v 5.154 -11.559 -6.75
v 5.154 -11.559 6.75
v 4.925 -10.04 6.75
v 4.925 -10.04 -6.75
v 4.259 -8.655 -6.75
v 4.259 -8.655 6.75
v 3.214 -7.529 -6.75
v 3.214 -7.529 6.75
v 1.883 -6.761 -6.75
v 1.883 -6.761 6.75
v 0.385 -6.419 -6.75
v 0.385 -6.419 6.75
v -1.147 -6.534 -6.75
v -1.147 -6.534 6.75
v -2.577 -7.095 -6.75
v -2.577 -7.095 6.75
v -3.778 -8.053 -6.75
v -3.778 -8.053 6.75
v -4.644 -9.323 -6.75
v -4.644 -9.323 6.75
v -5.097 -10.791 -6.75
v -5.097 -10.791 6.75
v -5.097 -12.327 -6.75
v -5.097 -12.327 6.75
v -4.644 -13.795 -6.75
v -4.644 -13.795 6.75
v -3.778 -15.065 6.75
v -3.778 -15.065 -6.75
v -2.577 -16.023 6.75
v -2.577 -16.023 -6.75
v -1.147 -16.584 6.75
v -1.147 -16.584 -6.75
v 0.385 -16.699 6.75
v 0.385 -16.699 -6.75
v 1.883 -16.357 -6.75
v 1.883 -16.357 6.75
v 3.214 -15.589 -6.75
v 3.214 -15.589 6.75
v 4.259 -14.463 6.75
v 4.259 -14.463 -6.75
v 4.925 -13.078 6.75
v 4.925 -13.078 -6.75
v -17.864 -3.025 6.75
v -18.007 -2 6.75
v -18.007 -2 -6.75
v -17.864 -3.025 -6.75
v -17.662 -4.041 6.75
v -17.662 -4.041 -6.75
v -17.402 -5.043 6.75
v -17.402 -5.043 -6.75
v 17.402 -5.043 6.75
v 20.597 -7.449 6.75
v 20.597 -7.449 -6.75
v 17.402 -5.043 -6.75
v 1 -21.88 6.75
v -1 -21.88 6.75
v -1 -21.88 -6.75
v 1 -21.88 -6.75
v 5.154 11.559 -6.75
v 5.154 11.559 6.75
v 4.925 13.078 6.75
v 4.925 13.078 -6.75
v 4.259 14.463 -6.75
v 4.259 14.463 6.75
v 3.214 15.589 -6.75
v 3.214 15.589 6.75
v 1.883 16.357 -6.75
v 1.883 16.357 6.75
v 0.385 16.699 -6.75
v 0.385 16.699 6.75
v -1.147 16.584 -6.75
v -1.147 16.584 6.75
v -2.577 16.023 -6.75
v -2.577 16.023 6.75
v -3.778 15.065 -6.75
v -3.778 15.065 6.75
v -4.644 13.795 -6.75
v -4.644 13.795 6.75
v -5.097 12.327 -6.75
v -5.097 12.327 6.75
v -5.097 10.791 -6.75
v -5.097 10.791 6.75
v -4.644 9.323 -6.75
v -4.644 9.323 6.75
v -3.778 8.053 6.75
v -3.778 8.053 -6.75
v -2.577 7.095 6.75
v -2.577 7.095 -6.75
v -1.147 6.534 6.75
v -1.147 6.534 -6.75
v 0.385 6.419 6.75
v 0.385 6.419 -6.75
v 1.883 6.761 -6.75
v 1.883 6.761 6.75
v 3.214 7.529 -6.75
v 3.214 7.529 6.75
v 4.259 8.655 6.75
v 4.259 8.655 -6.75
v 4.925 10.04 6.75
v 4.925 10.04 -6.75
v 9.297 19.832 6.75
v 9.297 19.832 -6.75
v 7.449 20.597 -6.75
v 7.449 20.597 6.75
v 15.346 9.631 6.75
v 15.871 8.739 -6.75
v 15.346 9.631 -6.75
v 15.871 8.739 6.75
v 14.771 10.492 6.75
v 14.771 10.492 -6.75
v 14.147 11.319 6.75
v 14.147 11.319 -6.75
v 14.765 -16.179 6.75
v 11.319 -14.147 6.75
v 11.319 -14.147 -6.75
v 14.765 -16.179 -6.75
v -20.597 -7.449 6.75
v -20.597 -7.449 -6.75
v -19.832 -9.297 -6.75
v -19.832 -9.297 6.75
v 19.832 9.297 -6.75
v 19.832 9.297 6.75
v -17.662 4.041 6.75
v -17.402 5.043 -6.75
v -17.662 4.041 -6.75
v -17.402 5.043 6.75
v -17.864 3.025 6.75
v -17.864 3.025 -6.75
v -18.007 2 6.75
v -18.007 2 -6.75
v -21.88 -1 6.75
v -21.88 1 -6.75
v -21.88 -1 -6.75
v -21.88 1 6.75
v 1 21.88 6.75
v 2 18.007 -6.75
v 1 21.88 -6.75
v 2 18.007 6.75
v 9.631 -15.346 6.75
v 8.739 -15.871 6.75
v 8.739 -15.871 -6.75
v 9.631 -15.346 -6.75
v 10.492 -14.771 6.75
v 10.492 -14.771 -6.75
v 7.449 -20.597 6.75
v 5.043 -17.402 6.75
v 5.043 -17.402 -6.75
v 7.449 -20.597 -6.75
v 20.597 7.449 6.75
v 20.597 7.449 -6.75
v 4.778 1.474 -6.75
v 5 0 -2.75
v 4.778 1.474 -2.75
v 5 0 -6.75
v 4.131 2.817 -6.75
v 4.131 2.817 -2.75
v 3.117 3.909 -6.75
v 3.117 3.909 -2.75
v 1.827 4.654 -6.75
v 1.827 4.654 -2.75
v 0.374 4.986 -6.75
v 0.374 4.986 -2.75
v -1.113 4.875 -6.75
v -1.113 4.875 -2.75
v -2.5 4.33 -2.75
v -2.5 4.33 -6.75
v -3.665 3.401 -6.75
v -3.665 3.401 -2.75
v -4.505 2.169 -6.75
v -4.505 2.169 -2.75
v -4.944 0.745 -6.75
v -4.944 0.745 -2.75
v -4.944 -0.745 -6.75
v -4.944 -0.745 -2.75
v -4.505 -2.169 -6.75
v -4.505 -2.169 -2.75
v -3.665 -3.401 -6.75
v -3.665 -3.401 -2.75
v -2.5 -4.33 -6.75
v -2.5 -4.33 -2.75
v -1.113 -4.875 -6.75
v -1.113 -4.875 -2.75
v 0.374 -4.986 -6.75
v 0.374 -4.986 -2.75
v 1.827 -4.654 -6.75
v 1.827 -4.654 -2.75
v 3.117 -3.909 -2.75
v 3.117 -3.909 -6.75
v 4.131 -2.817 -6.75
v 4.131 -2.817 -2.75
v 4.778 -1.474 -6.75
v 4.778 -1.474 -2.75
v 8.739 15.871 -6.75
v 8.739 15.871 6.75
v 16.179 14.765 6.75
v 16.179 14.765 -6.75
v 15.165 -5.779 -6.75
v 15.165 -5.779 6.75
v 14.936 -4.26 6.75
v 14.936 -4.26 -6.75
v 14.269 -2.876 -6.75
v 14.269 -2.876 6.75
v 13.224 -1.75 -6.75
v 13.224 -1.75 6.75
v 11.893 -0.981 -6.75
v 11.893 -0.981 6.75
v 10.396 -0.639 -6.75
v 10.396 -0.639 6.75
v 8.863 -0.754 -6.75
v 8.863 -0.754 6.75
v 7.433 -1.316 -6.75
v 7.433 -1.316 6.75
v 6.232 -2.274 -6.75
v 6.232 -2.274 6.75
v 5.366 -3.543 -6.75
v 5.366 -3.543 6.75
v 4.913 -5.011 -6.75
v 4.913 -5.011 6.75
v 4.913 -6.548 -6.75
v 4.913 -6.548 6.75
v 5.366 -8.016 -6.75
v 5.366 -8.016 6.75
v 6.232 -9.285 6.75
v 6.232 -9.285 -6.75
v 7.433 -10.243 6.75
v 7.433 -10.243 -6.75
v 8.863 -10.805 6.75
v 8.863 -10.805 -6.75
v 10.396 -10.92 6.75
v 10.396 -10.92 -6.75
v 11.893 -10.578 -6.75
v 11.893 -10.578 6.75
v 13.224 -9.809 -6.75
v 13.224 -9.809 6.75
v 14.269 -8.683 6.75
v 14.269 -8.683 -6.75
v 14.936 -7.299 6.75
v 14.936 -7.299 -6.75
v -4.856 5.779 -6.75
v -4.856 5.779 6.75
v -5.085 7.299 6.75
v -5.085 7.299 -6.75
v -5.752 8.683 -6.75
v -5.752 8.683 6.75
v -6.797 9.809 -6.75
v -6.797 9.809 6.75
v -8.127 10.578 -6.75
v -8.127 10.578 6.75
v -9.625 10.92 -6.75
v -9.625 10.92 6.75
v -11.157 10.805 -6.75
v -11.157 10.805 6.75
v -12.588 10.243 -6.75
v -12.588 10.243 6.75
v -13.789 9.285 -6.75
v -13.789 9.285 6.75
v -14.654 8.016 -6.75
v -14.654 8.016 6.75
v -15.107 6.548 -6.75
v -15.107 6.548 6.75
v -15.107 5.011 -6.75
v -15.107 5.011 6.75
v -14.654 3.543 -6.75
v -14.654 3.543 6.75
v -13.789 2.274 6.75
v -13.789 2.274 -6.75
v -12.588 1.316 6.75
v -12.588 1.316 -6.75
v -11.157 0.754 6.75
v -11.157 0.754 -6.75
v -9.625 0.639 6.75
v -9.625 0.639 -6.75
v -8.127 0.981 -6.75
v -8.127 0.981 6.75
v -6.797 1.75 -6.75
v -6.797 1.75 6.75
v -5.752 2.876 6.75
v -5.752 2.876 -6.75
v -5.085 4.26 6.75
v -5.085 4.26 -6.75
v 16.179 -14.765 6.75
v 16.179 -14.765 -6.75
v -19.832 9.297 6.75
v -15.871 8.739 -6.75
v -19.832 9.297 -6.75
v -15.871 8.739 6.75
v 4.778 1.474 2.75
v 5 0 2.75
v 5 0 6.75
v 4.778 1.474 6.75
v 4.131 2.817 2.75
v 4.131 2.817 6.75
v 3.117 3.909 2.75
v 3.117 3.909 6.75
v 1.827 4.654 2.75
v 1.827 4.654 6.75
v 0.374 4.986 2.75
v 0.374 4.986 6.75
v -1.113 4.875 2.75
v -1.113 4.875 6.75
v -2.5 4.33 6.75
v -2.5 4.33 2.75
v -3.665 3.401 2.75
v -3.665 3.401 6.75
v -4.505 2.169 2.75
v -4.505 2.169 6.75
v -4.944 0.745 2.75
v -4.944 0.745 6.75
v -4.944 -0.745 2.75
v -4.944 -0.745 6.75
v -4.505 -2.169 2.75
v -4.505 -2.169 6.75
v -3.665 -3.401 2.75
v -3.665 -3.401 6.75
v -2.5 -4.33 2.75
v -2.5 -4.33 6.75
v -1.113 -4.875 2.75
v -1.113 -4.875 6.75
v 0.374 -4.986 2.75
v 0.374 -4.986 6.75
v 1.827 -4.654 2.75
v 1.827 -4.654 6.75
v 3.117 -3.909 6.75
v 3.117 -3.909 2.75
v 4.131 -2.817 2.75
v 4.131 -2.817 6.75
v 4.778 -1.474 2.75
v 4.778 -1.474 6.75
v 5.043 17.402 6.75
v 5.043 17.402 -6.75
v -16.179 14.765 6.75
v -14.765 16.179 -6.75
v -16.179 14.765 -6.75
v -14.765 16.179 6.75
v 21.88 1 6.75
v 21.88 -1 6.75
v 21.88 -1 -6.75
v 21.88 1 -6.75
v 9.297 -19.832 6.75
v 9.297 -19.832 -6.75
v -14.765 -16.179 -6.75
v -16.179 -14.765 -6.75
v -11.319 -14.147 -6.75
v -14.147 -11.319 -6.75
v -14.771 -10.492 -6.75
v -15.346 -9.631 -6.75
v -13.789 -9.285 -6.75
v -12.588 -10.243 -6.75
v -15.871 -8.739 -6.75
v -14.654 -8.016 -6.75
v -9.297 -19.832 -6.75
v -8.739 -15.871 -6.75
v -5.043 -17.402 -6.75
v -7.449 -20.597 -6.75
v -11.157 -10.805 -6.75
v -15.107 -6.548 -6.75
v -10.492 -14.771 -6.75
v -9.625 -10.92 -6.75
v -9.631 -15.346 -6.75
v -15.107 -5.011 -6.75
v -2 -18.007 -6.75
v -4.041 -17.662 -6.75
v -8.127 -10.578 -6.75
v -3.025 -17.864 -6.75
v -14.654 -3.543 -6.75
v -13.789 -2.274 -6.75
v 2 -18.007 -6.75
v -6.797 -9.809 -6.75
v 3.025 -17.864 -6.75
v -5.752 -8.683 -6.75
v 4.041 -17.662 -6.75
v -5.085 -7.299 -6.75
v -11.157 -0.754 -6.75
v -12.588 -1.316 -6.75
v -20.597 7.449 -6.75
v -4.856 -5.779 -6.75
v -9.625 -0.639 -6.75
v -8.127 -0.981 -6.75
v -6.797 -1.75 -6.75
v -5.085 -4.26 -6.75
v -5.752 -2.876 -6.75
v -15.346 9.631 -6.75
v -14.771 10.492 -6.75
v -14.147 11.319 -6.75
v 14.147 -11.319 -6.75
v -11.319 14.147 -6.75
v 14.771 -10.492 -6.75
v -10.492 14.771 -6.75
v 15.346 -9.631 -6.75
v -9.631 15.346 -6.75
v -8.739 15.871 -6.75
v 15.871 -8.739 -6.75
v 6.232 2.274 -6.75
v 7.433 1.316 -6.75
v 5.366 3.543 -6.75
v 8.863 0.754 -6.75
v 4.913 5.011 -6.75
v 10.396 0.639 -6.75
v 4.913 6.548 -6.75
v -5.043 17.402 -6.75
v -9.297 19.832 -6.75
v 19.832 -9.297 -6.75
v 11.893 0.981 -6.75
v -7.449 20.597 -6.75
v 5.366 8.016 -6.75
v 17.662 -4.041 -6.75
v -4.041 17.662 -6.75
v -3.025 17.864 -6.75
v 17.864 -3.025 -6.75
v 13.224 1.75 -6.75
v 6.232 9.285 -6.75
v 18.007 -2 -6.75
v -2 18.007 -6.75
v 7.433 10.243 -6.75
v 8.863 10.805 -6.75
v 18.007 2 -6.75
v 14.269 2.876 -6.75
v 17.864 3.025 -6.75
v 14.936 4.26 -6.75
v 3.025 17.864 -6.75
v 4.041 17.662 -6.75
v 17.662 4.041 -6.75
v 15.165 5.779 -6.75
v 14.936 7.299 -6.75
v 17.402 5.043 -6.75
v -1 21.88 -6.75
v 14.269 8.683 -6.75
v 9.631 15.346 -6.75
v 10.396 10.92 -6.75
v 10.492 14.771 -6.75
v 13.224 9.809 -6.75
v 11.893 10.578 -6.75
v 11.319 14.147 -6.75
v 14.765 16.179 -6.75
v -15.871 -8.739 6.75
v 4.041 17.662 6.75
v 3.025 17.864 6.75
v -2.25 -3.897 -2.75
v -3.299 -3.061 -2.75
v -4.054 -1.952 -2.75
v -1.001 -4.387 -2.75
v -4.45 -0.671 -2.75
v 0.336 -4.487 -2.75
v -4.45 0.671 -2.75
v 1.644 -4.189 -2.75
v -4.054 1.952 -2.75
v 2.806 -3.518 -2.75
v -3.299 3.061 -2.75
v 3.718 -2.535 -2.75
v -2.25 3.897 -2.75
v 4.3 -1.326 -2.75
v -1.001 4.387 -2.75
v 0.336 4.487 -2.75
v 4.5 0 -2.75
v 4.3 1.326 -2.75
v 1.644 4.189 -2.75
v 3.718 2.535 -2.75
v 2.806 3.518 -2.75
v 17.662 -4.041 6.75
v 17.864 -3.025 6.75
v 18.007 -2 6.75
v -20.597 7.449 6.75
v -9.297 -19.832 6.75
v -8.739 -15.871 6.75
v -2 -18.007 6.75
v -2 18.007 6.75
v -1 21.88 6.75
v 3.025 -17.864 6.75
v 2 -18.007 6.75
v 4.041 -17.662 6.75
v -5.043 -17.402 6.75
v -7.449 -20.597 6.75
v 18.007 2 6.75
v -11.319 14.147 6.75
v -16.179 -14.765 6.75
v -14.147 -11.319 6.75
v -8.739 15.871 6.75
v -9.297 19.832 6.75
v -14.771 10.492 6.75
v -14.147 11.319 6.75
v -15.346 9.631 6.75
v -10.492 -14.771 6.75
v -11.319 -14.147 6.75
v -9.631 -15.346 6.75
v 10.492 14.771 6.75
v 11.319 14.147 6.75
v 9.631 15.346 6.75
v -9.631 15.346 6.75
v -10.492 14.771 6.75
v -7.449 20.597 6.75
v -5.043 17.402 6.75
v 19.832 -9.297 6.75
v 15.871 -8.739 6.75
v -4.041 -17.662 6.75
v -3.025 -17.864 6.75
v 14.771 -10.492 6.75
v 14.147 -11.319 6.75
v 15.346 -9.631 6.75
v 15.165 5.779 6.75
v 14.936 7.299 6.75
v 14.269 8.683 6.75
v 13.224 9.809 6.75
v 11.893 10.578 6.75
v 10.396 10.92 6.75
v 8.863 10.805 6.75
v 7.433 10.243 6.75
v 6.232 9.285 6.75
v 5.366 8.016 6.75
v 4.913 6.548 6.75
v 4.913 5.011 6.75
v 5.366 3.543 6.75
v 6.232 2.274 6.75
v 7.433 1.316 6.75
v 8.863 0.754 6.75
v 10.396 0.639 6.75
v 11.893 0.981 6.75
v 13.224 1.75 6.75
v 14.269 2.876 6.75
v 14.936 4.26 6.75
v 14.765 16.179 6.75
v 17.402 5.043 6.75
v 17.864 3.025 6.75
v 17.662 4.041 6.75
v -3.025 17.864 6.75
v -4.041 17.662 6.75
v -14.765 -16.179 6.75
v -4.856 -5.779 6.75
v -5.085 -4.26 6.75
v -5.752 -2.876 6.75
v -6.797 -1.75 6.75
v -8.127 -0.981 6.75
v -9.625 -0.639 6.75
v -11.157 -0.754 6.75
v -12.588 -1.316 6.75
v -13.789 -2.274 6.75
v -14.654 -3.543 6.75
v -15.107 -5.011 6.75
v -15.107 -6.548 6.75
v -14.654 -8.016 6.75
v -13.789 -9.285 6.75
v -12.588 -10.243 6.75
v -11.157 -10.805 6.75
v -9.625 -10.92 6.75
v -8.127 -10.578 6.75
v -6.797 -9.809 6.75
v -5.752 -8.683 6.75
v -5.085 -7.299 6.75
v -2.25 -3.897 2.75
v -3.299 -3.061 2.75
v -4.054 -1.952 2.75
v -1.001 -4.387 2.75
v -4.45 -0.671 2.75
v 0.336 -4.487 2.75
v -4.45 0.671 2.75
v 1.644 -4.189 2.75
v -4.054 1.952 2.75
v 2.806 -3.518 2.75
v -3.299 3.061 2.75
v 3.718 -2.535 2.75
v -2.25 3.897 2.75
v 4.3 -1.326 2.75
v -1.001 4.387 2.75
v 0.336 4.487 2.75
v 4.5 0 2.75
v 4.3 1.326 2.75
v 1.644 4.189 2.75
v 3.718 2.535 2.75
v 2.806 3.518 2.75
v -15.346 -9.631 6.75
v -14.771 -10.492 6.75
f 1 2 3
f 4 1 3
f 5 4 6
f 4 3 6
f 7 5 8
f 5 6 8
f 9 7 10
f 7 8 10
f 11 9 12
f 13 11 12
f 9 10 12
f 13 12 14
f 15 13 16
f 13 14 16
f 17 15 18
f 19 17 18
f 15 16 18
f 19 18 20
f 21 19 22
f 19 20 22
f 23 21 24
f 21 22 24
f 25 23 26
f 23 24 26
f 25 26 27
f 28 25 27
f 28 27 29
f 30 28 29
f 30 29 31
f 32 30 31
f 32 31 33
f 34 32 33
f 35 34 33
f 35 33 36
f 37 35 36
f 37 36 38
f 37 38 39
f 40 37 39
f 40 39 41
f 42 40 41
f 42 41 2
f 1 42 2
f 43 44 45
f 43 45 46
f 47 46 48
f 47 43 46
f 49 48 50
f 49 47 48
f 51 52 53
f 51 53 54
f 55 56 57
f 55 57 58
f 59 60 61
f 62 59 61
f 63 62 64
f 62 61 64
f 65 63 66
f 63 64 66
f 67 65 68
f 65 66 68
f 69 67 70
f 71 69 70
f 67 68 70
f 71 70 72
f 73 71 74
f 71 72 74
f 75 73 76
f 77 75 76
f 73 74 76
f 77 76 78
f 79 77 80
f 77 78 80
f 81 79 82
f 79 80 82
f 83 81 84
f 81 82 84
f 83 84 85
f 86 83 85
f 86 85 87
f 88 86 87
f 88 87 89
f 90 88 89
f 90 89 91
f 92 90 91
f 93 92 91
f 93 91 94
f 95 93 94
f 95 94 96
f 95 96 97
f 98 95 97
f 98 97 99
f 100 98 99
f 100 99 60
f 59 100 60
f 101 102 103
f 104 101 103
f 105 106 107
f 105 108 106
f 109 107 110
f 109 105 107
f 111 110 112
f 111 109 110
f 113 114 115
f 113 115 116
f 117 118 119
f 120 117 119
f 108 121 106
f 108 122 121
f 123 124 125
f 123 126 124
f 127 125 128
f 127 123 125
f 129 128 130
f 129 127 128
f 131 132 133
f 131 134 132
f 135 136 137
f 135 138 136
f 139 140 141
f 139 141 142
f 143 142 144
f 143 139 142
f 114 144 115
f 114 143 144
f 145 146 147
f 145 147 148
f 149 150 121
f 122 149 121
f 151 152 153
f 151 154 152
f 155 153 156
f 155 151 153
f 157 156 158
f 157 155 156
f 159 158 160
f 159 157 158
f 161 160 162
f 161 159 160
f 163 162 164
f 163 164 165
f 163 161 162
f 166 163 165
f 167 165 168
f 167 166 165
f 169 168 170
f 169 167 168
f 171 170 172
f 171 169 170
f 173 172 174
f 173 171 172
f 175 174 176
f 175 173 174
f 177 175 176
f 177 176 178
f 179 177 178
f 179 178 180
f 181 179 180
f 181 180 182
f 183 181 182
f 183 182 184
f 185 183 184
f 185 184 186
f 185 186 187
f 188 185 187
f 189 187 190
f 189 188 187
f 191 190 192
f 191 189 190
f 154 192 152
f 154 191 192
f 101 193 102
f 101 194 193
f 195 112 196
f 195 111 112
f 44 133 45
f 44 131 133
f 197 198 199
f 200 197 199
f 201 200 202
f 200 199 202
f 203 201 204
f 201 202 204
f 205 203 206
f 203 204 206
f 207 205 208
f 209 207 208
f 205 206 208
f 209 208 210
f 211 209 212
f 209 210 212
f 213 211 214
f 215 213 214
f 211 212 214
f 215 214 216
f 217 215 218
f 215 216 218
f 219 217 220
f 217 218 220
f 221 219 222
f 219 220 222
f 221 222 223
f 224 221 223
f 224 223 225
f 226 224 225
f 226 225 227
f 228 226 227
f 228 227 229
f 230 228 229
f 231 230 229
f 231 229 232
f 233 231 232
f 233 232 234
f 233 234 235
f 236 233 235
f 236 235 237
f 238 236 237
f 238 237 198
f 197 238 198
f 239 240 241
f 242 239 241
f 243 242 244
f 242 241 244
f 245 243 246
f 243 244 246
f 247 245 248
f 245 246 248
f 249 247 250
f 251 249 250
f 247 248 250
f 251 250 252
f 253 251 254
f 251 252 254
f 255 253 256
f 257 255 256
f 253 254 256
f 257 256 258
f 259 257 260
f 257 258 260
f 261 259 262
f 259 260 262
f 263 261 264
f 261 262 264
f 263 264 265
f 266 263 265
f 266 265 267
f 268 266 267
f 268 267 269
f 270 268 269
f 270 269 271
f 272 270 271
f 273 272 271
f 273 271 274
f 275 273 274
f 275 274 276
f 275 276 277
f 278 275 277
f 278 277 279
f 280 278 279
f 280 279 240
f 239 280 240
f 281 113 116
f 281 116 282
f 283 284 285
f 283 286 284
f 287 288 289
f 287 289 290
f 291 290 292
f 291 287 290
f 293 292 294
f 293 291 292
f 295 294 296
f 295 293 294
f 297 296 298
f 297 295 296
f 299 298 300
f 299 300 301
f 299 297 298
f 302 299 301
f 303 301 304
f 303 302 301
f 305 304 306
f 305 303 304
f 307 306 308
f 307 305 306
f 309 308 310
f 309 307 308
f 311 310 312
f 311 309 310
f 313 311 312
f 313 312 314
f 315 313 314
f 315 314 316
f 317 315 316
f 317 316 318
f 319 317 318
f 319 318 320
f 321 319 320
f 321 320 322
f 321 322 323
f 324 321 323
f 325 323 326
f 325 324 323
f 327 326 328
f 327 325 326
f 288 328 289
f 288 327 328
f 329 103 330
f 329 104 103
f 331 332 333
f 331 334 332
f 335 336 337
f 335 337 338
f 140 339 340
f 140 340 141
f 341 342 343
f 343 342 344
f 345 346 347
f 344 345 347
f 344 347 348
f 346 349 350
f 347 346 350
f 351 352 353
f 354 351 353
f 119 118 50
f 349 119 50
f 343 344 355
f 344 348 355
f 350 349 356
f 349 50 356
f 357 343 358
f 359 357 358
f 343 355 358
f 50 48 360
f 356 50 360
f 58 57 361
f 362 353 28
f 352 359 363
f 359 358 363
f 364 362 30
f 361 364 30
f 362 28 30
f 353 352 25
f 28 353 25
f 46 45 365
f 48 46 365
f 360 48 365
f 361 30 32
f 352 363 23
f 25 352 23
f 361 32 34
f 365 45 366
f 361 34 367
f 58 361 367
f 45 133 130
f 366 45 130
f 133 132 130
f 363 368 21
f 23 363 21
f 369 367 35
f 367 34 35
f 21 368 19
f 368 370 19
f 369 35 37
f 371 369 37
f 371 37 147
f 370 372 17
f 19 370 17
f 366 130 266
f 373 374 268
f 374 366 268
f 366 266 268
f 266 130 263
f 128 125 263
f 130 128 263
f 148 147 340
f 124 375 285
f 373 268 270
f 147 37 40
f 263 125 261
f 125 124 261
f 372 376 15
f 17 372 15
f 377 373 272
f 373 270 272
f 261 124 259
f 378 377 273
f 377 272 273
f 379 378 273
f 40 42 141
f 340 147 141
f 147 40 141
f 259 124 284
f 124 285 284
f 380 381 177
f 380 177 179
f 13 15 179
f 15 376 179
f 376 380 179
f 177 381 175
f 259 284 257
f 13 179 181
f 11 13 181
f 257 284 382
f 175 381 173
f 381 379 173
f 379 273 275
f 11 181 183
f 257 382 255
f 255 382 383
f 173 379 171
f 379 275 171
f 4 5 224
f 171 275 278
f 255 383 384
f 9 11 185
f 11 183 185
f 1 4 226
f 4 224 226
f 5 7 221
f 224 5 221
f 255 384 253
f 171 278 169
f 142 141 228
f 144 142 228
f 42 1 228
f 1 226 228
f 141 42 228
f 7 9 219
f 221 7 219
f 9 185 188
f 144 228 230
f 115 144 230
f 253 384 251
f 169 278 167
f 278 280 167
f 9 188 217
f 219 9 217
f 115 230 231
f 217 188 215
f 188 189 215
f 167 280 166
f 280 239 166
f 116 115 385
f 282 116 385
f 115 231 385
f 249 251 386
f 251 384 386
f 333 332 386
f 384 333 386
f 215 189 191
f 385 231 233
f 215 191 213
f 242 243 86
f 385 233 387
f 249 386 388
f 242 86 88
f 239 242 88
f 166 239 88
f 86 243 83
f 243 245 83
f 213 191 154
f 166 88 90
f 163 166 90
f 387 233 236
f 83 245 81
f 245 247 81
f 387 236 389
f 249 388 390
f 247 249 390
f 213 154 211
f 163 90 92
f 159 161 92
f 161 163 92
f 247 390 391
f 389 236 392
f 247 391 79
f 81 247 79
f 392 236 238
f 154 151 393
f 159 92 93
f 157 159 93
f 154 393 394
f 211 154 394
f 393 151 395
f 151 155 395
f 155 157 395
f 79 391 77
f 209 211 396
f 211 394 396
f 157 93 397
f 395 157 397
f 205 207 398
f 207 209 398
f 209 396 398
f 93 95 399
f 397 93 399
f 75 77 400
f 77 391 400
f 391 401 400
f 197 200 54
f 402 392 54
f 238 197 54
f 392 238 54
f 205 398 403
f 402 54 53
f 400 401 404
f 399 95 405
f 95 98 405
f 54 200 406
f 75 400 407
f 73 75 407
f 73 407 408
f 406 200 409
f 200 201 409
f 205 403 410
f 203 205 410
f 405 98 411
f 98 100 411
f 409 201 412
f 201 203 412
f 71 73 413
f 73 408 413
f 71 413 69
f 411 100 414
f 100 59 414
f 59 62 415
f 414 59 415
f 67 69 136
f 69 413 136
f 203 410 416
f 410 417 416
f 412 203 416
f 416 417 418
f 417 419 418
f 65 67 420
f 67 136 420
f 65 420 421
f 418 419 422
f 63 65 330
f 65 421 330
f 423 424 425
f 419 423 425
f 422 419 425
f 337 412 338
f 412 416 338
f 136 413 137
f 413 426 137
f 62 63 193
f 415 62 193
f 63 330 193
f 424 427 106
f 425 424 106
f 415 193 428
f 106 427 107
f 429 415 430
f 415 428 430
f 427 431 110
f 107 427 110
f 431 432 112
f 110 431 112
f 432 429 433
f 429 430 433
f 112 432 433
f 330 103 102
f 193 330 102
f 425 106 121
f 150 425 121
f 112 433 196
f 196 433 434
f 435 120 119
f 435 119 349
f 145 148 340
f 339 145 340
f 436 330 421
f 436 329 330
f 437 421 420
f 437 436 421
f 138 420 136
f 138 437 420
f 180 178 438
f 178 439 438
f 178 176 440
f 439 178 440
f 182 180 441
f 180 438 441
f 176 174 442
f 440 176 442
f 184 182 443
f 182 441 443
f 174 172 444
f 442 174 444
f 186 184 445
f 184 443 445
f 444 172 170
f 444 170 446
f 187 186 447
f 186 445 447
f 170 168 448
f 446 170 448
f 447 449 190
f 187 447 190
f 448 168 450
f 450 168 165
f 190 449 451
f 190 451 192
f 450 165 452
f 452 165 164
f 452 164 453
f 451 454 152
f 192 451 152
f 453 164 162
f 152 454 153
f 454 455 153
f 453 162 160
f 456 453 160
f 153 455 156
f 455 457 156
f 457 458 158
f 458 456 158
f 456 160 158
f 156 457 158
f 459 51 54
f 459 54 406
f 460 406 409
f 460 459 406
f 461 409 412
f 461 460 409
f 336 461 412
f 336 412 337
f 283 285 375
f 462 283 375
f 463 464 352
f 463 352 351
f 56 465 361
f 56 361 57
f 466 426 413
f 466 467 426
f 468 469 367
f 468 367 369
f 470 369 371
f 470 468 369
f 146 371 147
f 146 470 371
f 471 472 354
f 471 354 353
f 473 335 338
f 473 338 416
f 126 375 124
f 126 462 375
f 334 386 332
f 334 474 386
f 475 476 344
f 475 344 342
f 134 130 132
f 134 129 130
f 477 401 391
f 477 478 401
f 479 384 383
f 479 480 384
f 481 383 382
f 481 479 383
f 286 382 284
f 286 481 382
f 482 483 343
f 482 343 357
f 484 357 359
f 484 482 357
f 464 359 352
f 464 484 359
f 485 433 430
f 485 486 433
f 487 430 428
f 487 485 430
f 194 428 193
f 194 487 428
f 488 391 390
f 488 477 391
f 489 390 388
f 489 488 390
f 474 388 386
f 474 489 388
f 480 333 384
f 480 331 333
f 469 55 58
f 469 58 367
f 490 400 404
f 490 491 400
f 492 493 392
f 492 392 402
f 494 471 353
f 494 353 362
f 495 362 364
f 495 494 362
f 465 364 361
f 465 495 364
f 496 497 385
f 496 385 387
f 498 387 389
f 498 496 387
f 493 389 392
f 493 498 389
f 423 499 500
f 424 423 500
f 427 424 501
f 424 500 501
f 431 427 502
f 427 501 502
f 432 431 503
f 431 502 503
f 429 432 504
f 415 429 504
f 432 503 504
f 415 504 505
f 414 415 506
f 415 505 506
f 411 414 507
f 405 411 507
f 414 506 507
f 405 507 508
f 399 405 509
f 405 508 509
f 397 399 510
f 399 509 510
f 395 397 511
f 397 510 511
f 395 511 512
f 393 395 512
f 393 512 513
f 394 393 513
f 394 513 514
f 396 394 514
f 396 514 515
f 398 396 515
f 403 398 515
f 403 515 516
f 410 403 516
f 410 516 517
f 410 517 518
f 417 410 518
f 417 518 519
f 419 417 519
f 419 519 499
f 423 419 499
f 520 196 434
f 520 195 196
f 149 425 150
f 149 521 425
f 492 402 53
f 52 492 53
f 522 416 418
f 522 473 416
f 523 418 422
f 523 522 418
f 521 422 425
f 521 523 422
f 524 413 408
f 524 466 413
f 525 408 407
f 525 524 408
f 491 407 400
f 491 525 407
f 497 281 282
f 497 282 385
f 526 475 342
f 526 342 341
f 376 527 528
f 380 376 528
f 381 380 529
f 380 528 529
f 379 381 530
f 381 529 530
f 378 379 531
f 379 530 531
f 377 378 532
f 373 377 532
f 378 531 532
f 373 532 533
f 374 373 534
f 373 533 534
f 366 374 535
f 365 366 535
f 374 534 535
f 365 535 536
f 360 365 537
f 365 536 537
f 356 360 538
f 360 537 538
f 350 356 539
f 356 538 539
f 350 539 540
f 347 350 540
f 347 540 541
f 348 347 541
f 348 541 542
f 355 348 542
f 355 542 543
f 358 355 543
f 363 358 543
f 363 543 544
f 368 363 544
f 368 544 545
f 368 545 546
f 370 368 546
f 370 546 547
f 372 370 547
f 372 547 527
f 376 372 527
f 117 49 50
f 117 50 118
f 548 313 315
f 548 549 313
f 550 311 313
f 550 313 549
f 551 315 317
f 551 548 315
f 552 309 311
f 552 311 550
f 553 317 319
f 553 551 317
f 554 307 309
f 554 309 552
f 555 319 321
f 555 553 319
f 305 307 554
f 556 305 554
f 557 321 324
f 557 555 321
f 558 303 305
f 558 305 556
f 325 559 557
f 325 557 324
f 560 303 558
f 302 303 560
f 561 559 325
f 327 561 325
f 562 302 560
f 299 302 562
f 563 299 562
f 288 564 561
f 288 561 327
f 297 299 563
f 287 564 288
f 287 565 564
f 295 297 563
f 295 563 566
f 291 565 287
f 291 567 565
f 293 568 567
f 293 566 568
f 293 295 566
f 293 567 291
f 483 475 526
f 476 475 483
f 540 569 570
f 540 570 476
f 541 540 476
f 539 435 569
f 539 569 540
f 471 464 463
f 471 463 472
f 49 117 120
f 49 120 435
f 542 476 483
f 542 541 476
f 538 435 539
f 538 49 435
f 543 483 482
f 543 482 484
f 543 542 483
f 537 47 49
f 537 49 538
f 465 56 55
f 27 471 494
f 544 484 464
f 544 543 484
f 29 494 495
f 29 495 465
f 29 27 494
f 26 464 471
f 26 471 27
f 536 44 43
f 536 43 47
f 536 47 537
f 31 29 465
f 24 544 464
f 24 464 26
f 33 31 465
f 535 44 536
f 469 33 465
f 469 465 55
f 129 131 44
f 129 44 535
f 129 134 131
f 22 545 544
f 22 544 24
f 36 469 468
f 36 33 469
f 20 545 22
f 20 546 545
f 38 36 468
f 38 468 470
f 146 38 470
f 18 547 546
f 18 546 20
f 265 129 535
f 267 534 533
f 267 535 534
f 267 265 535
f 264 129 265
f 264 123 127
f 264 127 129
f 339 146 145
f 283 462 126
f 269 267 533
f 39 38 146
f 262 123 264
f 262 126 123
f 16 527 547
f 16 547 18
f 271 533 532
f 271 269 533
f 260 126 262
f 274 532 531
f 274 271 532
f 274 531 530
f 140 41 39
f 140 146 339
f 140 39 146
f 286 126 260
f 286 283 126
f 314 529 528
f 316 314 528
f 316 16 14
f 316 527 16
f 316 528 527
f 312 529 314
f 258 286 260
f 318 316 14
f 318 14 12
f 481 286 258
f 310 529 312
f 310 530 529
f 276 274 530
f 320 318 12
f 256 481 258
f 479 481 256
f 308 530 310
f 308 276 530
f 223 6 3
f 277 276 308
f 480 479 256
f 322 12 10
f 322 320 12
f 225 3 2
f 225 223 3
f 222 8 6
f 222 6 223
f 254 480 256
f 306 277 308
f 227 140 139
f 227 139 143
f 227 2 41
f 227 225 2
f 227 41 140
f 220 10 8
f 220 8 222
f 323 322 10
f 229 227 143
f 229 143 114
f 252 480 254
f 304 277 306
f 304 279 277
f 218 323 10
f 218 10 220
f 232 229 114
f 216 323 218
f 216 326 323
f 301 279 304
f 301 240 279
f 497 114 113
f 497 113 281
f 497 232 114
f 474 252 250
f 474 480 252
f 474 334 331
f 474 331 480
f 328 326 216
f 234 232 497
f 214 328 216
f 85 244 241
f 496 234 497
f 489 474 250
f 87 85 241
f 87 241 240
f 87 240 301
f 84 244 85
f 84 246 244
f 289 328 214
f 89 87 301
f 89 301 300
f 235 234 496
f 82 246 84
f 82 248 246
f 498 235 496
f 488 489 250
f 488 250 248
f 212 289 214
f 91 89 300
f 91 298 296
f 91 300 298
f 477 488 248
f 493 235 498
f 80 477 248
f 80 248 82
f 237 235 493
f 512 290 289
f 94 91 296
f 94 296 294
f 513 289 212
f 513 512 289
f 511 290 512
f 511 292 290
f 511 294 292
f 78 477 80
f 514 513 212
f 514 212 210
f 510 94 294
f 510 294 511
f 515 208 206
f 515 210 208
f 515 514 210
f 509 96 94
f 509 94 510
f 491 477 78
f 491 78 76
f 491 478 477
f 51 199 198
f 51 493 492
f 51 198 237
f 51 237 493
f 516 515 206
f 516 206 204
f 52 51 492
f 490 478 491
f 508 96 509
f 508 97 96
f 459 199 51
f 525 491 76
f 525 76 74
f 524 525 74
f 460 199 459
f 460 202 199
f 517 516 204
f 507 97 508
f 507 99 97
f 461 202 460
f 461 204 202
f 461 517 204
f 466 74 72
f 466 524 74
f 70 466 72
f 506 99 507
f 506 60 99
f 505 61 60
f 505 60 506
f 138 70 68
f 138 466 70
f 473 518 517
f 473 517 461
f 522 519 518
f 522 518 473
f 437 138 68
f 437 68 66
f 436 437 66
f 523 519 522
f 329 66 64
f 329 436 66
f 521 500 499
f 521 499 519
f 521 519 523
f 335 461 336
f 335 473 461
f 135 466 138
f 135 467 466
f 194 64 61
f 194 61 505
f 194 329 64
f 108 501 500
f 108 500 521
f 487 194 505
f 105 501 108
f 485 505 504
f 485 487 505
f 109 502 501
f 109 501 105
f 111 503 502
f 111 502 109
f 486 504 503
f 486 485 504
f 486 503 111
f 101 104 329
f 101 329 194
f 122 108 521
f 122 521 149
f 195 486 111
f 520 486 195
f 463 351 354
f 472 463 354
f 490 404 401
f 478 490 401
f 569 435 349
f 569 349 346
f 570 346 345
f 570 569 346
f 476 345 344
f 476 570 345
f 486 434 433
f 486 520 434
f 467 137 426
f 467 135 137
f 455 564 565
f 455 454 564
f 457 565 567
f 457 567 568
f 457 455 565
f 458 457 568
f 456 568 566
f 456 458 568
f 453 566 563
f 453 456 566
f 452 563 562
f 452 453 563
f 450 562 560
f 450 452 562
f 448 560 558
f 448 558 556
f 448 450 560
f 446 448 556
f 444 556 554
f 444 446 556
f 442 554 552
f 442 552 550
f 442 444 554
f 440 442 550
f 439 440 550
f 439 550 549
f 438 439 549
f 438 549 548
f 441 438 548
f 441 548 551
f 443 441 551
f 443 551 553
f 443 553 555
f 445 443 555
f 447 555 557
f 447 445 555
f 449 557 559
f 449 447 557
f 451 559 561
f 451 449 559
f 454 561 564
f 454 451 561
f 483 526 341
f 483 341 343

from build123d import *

# Parameters (mm, degrees)
F0_R     = 5
F1_DEPTH = 6.75
F0_R_2   = 4.5
F2_DEPTH = 2.75
F3_R     = 5.154476
F4_DEPTH = 13.501


with BuildPart() as f1:
    # F0 (on Top) → F1 (new body, symmetric)
    with BuildSketch(Plane.XY):
        with BuildLine():
            Line((-21.880162, -1), (-18.007179, -2))
            ThreePointArc((-18.007179, -2), (-17.769775, -3.534628), (-17.401831, -5.04329))
            Line((-17.401831, -5.04329), (-20.597318, -7.449296))
            Line((-20.597318, -7.449296), (-19.831951, -9.297055))
            Line((-19.831951, -9.297055), (-15.871097, -8.738808))
            ThreePointArc((-15.871097, -8.738808), (-15.064488, -10.065769), (-14.147212, -11.318785))
            Line((-14.147212, -11.318785), (-16.178718, -14.764504))
            Line((-16.178718, -14.764504), (-14.764504, -16.178718))
            Line((-14.764504, -16.178718), (-11.318785, -14.147212))
            ThreePointArc((-11.318785, -14.147212), (-10.065769, -15.064488), (-8.738808, -15.871097))
            Line((-8.738808, -15.871097), (-9.297055, -19.831951))
            Line((-9.297055, -19.831951), (-7.449296, -20.597318))
            Line((-7.449296, -20.597318), (-5.04329, -17.401831))
            ThreePointArc((-5.04329, -17.401831), (-3.534628, -17.769775), (-2, -18.007179))
            Line((-2, -18.007179), (-1, -21.880162))
            Line((-1, -21.880162), (1, -21.880162))
            Line((1, -21.880162), (2, -18.007179))
            ThreePointArc((2, -18.007179), (3.534628, -17.769775), (5.04329, -17.401831))
            Line((5.04329, -17.401831), (7.449296, -20.597318))
            Line((7.449296, -20.597318), (9.297055, -19.831951))
            Line((9.297055, -19.831951), (8.738808, -15.871097))
            ThreePointArc((8.738808, -15.871097), (10.065769, -15.064488), (11.318785, -14.147212))
            Line((11.318785, -14.147212), (14.764504, -16.178718))
            Line((14.764504, -16.178718), (16.178718, -14.764504))
            Line((16.178718, -14.764504), (14.147212, -11.318785))
            ThreePointArc((14.147212, -11.318785), (15.064488, -10.065769), (15.871097, -8.738808))
            Line((15.871097, -8.738808), (19.831951, -9.297055))
            Line((19.831951, -9.297055), (20.597318, -7.449296))
            Line((20.597318, -7.449296), (17.401831, -5.04329))
            ThreePointArc((17.401831, -5.04329), (17.769775, -3.534628), (18.007179, -2))
            Line((18.007179, -2), (21.880162, -1))
            Line((21.880162, -1), (21.880162, 1))
            Line((21.880162, 1), (18.007179, 2))
            ThreePointArc((18.007179, 2), (17.769775, 3.534628), (17.401831, 5.04329))
            Line((17.401831, 5.04329), (20.597318, 7.449296))
            Line((20.597318, 7.449296), (19.831951, 9.297055))
            Line((19.831951, 9.297055), (15.871097, 8.738808))
            ThreePointArc((15.871097, 8.738808), (15.064488, 10.065769), (14.147212, 11.318785))
            Line((14.147212, 11.318785), (16.178718, 14.764504))
            Line((16.178718, 14.764504), (14.764504, 16.178718))
            Line((14.764504, 16.178718), (11.318785, 14.147212))
            ThreePointArc((11.318785, 14.147212), (10.065769, 15.064488), (8.738808, 15.871097))
            Line((8.738808, 15.871097), (9.297055, 19.831951))
            Line((9.297055, 19.831951), (7.449296, 20.597318))
            Line((7.449296, 20.597318), (5.04329, 17.401831))
            ThreePointArc((5.04329, 17.401831), (3.534628, 17.769775), (2, 18.007179))
            Line((2, 18.007179), (1, 21.880162))
            Line((1, 21.880162), (-1, 21.880162))
            Line((-1, 21.880162), (-2, 18.007179))
            ThreePointArc((-2, 18.007179), (-3.534628, 17.769775), (-5.04329, 17.401831))
            Line((-5.04329, 17.401831), (-7.449296, 20.597318))
            Line((-7.449296, 20.597318), (-9.297055, 19.831951))
            Line((-9.297055, 19.831951), (-8.738808, 15.871097))
            ThreePointArc((-8.738808, 15.871097), (-10.065769, 15.064488), (-11.318785, 14.147212))
            Line((-11.318785, 14.147212), (-14.764504, 16.178718))
            Line((-14.764504, 16.178718), (-16.178718, 14.764504))
            Line((-16.178718, 14.764504), (-14.147212, 11.318785))
            ThreePointArc((-14.147212, 11.318785), (-15.064488, 10.065769), (-15.871097, 8.738808))
            Line((-15.871097, 8.738808), (-19.831951, 9.297055))
            Line((-19.831951, 9.297055), (-20.597318, 7.449296))
            Line((-20.597318, 7.449296), (-17.401831, 5.04329))
            ThreePointArc((-17.401831, 5.04329), (-17.769775, 3.534628), (-18.007179, 2))
            Line((-18.007179, 2), (-21.880162, 1))
            Line((-21.880162, 1), (-21.880162, -1))
        make_face()
        Circle(F0_R, mode=Mode.SUBTRACT)
    extrude(amount=F1_DEPTH, both=True)

    # F0 (on Top) → F2 (join, symmetric)
    with BuildSketch(Plane.XY):
        Circle(F0_R)
        Circle(F0_R_2, mode=Mode.SUBTRACT)
    extrude(amount=F2_DEPTH, both=True)

    # F3 (on face) → F4 (cut, through all)
    with BuildSketch(Plane.XY.offset(6.75)):
        with Locations((0, 11.558953)):
            Circle(F3_R)
        with Locations((-10.010347, 5.779476)):
            Circle(F3_R)
        with Locations((-10.010347, -5.779476)):
            Circle(F3_R)
        with Locations((0, -11.558953)):
            Circle(F3_R)
        with Locations((10.010347, -5.779476)):
            Circle(F3_R)
        with Locations((10.010347, 5.779476)):
            Circle(F3_R)
    extrude(amount=-F4_DEPTH, mode=Mode.SUBTRACT)


solid = f1.part
